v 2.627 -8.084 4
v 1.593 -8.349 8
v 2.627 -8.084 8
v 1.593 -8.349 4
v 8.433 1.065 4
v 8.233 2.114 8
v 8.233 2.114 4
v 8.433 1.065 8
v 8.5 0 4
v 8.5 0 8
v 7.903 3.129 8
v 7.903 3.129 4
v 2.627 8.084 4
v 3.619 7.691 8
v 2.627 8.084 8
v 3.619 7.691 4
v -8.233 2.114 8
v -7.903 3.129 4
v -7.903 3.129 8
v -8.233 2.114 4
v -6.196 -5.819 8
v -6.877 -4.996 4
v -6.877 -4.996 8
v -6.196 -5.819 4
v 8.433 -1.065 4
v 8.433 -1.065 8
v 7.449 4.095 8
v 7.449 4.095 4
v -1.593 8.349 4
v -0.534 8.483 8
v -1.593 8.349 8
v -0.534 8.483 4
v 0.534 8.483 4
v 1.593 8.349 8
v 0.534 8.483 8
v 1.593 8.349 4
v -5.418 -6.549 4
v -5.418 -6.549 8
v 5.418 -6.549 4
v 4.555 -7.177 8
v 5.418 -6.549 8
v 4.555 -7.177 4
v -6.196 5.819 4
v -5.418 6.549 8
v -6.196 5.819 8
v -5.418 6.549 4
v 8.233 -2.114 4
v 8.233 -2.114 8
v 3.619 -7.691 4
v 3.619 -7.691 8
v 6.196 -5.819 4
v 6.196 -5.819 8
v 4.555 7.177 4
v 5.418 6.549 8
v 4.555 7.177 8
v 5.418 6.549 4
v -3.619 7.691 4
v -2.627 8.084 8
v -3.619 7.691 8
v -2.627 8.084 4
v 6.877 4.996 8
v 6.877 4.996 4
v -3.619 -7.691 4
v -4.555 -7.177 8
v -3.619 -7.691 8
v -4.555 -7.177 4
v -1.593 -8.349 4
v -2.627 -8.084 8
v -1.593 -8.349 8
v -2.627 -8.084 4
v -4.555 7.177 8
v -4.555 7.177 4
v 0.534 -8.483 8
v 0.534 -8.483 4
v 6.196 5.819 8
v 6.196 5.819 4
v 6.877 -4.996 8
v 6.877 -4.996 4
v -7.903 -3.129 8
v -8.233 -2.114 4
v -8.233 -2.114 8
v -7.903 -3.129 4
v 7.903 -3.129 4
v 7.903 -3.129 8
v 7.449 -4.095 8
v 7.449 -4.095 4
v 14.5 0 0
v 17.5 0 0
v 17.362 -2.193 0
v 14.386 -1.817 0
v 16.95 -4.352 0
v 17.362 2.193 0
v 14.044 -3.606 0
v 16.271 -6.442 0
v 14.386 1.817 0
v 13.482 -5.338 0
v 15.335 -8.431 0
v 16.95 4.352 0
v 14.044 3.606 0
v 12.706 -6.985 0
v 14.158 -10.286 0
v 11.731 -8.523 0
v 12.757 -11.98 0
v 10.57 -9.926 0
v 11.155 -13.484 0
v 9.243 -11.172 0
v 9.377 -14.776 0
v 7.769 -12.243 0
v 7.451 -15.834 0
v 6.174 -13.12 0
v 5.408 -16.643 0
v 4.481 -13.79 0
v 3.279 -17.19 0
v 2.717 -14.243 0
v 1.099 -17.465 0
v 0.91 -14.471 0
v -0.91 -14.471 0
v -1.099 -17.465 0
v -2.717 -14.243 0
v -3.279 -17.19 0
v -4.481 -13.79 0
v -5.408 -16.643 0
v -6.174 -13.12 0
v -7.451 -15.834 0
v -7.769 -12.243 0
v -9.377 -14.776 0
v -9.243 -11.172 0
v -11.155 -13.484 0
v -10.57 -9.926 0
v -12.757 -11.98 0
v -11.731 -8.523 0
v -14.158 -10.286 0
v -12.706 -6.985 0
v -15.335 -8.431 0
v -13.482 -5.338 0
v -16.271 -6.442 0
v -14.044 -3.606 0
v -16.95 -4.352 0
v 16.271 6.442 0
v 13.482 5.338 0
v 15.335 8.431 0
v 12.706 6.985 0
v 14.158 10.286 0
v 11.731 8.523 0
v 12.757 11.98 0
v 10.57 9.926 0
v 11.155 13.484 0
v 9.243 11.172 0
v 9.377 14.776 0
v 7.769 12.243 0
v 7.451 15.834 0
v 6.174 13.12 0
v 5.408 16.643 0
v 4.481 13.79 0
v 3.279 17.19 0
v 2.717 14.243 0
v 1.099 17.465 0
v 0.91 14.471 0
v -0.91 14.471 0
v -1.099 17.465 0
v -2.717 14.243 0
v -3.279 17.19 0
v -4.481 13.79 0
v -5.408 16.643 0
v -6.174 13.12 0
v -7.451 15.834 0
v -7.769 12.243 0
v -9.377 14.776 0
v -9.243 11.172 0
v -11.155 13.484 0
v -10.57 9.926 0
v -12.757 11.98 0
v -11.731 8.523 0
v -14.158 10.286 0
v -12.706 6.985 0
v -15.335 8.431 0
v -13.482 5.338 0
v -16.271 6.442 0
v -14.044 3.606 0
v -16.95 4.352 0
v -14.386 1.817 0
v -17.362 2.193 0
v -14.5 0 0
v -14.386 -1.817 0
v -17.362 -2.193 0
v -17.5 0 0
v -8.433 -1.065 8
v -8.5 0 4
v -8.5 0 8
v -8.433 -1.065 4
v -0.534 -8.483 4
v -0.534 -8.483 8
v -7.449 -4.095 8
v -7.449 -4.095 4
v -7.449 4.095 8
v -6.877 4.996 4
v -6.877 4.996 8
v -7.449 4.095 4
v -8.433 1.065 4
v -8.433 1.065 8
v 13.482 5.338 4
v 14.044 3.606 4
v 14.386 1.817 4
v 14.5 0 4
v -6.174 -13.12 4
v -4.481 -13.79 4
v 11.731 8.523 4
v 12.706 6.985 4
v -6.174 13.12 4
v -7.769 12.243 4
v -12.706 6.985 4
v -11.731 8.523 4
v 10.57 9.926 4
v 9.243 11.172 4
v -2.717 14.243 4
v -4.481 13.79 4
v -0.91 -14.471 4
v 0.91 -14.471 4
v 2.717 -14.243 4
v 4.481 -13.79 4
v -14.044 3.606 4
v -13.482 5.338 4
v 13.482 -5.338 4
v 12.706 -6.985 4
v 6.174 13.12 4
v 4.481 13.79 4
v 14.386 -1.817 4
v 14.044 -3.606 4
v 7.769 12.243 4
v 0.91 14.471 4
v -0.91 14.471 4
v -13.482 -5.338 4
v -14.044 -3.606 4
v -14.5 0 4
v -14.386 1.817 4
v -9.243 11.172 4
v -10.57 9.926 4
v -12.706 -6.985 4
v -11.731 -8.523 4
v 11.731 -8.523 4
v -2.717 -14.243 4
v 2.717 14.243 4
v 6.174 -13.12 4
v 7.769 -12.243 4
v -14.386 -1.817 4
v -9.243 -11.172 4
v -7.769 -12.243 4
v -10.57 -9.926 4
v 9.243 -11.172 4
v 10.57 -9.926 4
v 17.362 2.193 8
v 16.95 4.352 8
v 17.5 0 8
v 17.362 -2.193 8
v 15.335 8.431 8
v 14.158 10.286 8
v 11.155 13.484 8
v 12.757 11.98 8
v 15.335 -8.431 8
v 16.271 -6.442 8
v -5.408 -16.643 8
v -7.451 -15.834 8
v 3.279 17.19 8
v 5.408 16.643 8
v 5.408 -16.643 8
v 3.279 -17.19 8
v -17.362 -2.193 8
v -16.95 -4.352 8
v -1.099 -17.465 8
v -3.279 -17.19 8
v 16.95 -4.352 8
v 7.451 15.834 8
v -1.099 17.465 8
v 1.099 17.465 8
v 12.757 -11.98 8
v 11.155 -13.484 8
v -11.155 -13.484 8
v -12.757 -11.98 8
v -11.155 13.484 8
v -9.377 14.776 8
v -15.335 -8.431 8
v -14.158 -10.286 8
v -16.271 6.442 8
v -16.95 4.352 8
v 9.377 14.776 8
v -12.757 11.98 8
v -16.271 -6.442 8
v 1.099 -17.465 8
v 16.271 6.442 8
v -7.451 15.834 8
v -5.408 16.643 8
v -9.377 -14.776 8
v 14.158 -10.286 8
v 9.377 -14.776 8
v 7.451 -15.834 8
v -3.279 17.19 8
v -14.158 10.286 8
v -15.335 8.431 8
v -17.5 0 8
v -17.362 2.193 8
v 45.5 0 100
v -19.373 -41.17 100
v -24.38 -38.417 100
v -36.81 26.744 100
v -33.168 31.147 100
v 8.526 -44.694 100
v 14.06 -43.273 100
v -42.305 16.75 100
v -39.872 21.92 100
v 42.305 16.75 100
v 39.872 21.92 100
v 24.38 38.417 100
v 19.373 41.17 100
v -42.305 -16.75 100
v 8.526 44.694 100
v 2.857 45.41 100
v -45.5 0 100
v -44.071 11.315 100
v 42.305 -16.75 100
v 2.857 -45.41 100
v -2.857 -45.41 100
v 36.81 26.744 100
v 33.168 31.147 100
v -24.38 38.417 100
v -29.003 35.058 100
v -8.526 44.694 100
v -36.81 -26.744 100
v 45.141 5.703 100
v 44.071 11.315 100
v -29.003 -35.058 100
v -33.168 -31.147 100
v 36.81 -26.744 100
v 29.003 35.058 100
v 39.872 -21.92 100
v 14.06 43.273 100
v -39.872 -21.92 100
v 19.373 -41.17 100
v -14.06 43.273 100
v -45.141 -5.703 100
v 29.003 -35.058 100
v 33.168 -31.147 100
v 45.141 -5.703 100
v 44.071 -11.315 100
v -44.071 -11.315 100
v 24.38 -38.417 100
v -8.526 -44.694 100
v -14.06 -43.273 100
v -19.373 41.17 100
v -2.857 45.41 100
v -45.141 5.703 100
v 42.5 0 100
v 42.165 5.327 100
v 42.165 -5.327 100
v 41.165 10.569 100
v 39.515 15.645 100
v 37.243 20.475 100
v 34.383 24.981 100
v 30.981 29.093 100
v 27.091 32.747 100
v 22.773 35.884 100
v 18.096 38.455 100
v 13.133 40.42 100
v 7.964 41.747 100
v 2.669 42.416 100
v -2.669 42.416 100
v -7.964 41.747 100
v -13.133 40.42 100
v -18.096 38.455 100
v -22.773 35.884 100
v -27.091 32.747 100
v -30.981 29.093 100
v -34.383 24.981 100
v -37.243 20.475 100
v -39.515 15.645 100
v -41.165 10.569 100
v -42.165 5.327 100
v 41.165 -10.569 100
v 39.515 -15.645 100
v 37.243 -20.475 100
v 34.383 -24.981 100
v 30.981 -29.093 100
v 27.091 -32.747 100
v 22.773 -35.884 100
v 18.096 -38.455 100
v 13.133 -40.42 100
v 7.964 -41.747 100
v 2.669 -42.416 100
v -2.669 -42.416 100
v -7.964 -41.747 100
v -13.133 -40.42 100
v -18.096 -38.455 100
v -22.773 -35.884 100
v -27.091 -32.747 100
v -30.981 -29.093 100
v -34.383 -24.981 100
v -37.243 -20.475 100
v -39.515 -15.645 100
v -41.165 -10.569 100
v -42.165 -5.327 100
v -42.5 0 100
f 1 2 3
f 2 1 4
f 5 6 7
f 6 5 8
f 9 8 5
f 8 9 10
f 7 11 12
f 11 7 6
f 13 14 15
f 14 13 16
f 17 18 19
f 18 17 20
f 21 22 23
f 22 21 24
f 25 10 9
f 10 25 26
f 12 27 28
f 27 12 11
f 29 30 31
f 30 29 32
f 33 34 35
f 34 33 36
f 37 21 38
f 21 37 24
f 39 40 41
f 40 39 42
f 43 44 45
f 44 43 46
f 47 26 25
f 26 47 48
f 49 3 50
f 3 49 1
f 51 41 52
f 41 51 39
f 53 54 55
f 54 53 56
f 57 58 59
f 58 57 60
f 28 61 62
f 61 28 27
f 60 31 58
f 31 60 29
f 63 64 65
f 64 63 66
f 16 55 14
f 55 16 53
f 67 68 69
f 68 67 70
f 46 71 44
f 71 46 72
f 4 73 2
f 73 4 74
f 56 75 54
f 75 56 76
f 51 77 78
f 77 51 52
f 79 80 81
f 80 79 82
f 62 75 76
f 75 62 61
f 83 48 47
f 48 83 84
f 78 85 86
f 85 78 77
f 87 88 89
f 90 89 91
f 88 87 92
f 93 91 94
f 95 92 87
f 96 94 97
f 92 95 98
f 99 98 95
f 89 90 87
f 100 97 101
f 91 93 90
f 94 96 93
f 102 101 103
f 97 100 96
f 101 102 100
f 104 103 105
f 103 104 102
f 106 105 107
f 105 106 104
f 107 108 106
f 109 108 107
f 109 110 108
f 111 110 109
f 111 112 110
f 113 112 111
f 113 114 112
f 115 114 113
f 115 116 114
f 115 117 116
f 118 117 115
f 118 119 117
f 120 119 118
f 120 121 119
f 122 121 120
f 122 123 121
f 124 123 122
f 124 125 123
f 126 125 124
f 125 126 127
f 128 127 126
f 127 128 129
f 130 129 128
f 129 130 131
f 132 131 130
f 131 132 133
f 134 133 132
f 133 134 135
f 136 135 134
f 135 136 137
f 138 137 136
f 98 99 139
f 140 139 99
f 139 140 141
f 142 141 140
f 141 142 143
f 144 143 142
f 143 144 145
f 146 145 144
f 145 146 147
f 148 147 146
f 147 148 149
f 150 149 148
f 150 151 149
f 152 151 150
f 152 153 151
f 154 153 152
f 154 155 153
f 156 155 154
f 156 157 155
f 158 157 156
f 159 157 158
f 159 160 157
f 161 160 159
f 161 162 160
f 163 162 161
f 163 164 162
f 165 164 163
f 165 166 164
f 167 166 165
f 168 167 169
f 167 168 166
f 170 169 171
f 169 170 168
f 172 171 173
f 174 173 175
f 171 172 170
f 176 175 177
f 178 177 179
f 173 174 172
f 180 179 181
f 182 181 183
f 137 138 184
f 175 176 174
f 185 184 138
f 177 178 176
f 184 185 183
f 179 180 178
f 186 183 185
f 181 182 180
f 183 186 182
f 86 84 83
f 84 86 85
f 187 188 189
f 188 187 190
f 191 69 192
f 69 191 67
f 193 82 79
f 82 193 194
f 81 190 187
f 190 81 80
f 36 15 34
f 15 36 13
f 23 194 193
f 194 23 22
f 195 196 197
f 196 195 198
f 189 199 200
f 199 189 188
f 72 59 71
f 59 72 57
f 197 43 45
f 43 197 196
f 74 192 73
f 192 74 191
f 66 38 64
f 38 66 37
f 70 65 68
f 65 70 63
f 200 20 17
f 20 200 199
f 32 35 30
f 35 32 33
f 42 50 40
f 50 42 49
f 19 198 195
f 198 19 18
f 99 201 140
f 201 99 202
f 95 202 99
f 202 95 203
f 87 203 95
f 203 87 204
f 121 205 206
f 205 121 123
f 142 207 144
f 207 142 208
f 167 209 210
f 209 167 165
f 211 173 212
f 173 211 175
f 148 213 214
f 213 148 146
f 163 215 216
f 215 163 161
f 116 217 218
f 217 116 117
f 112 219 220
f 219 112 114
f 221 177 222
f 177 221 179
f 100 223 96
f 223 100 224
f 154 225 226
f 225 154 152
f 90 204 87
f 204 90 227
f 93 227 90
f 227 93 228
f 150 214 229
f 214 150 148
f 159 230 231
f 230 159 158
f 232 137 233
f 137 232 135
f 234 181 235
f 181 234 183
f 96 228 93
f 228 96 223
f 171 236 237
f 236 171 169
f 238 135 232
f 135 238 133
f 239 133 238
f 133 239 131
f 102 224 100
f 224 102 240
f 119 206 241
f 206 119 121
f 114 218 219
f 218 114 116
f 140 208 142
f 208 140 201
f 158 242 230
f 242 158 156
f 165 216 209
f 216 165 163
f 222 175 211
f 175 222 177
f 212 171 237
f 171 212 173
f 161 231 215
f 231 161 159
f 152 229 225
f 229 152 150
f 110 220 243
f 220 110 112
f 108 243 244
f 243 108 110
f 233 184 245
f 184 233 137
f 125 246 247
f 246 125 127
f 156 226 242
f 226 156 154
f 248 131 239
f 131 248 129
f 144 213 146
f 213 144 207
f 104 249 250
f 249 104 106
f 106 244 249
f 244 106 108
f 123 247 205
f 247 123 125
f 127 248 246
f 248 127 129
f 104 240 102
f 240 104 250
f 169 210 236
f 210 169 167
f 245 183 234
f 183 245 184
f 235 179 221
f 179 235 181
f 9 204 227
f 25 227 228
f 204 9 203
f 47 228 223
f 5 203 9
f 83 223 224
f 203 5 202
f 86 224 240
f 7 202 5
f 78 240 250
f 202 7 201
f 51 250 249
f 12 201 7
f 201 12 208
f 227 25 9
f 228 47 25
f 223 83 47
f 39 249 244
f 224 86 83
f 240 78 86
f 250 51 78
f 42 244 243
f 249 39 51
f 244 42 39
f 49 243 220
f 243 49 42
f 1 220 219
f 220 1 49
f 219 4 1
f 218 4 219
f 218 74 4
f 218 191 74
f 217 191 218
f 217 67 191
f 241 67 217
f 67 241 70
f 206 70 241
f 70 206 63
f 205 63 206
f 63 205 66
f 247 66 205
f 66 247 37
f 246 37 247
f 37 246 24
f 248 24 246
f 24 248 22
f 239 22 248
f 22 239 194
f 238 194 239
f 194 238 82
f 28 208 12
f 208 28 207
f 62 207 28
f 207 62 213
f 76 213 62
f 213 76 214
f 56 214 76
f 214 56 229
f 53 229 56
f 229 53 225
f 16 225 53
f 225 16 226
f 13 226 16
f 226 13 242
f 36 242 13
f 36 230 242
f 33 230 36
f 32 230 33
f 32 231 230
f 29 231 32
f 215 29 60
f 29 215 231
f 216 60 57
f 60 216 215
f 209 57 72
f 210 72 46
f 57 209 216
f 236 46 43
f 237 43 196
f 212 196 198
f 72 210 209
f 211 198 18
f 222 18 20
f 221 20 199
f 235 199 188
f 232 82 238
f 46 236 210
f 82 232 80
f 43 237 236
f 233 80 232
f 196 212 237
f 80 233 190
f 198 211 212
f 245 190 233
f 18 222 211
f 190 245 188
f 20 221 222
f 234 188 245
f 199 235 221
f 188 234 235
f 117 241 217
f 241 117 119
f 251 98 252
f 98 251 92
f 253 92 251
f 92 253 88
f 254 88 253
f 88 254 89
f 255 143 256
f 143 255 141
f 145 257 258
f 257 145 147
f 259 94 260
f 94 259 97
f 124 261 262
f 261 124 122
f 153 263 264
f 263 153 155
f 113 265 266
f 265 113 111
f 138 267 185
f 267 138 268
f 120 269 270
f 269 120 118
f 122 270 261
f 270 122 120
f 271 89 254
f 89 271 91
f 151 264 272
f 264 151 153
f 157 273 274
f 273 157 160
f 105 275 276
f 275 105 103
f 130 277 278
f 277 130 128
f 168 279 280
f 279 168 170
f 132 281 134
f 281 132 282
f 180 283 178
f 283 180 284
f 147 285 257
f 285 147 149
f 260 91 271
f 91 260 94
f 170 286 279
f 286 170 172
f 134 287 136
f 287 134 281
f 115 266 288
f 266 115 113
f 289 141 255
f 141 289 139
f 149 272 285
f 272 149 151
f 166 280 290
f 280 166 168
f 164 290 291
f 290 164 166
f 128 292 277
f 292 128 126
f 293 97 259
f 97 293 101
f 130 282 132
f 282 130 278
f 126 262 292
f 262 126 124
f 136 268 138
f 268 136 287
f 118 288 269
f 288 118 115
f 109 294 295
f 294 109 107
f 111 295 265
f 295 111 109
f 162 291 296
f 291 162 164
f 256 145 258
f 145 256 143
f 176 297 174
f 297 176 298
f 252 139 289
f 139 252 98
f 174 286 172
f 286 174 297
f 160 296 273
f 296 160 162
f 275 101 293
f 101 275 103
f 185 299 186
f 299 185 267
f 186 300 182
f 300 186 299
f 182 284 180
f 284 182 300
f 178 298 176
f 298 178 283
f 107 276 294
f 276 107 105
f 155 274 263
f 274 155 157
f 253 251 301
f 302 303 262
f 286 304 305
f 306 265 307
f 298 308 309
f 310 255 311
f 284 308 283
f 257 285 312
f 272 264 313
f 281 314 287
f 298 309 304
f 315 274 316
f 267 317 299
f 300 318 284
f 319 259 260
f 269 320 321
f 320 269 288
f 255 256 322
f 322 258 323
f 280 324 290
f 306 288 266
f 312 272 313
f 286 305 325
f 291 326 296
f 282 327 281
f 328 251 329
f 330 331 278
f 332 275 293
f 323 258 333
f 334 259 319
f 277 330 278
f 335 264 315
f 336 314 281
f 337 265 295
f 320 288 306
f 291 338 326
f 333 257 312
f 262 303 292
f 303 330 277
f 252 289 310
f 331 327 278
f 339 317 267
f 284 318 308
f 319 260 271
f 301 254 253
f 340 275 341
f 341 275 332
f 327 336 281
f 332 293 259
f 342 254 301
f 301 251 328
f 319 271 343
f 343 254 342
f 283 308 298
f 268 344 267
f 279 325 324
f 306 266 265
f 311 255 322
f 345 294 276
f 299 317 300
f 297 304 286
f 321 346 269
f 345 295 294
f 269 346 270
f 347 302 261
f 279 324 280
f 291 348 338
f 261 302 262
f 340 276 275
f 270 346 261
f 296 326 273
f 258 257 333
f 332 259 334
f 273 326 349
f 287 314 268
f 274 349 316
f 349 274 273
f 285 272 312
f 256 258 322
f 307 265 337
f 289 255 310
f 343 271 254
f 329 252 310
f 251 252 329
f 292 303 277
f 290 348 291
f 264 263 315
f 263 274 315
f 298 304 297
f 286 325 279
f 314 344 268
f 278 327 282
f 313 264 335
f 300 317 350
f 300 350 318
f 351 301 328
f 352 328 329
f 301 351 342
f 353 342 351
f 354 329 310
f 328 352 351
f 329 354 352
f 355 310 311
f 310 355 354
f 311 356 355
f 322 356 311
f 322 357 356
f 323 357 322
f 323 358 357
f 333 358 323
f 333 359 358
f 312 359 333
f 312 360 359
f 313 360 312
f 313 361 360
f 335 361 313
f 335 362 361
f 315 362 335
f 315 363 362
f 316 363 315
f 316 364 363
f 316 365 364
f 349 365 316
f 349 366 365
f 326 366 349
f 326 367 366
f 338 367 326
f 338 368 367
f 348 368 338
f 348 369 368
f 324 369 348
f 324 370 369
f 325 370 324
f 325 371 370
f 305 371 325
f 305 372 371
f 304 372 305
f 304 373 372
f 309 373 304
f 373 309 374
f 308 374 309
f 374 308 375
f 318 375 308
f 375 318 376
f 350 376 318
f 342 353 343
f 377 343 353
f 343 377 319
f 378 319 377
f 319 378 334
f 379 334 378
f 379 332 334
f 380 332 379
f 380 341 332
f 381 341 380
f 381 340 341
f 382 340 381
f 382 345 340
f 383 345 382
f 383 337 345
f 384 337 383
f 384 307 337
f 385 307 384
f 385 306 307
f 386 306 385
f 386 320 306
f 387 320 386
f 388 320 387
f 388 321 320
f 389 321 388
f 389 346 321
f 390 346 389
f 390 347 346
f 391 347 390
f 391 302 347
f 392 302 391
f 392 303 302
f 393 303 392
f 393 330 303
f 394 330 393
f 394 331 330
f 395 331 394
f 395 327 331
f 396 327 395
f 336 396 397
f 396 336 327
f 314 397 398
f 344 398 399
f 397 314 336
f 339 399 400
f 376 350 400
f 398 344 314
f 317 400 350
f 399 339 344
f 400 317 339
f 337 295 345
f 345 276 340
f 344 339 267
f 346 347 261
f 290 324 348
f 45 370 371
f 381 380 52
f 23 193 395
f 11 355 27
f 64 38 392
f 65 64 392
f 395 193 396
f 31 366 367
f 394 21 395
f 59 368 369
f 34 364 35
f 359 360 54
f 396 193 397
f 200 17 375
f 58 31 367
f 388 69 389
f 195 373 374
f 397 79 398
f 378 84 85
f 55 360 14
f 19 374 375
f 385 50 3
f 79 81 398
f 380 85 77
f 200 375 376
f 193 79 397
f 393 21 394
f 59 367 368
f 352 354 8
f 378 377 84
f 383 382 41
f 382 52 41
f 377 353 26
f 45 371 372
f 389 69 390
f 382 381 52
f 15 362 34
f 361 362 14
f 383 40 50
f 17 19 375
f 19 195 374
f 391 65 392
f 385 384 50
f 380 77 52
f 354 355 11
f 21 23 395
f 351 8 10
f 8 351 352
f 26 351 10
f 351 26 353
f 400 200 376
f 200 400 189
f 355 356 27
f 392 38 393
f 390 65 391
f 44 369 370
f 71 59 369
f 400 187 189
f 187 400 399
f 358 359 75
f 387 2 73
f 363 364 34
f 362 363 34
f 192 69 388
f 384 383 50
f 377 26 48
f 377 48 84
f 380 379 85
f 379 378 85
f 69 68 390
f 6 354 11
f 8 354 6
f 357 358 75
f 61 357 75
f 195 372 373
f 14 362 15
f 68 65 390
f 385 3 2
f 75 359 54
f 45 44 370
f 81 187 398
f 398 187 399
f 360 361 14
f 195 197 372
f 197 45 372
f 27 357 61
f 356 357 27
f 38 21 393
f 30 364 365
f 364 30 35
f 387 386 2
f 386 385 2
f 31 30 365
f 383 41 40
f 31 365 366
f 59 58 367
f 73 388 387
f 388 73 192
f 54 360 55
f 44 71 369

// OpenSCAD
$fn=50;

ID=17;
OD=29;
LAP=4;
HH=100;

scale=5;
wall=(OD-ID)/2;
echo(wall);

module main() {
  difference() {
    cylinder(LAP+4,d=OD+wall);
    union() {
      cylinder(HH,d=ID);
      cylinder(LAP,d=OD);
    }
  }
  
  translate([0,0,LAP+4])
  difference() {
    cylinder(HH-(LAP+4),d1=OD+wall,d2=ID*scale+wall);
    cylinder(HH-(LAP+4),d1=ID,d2=ID*scale);
  }
}



main();
